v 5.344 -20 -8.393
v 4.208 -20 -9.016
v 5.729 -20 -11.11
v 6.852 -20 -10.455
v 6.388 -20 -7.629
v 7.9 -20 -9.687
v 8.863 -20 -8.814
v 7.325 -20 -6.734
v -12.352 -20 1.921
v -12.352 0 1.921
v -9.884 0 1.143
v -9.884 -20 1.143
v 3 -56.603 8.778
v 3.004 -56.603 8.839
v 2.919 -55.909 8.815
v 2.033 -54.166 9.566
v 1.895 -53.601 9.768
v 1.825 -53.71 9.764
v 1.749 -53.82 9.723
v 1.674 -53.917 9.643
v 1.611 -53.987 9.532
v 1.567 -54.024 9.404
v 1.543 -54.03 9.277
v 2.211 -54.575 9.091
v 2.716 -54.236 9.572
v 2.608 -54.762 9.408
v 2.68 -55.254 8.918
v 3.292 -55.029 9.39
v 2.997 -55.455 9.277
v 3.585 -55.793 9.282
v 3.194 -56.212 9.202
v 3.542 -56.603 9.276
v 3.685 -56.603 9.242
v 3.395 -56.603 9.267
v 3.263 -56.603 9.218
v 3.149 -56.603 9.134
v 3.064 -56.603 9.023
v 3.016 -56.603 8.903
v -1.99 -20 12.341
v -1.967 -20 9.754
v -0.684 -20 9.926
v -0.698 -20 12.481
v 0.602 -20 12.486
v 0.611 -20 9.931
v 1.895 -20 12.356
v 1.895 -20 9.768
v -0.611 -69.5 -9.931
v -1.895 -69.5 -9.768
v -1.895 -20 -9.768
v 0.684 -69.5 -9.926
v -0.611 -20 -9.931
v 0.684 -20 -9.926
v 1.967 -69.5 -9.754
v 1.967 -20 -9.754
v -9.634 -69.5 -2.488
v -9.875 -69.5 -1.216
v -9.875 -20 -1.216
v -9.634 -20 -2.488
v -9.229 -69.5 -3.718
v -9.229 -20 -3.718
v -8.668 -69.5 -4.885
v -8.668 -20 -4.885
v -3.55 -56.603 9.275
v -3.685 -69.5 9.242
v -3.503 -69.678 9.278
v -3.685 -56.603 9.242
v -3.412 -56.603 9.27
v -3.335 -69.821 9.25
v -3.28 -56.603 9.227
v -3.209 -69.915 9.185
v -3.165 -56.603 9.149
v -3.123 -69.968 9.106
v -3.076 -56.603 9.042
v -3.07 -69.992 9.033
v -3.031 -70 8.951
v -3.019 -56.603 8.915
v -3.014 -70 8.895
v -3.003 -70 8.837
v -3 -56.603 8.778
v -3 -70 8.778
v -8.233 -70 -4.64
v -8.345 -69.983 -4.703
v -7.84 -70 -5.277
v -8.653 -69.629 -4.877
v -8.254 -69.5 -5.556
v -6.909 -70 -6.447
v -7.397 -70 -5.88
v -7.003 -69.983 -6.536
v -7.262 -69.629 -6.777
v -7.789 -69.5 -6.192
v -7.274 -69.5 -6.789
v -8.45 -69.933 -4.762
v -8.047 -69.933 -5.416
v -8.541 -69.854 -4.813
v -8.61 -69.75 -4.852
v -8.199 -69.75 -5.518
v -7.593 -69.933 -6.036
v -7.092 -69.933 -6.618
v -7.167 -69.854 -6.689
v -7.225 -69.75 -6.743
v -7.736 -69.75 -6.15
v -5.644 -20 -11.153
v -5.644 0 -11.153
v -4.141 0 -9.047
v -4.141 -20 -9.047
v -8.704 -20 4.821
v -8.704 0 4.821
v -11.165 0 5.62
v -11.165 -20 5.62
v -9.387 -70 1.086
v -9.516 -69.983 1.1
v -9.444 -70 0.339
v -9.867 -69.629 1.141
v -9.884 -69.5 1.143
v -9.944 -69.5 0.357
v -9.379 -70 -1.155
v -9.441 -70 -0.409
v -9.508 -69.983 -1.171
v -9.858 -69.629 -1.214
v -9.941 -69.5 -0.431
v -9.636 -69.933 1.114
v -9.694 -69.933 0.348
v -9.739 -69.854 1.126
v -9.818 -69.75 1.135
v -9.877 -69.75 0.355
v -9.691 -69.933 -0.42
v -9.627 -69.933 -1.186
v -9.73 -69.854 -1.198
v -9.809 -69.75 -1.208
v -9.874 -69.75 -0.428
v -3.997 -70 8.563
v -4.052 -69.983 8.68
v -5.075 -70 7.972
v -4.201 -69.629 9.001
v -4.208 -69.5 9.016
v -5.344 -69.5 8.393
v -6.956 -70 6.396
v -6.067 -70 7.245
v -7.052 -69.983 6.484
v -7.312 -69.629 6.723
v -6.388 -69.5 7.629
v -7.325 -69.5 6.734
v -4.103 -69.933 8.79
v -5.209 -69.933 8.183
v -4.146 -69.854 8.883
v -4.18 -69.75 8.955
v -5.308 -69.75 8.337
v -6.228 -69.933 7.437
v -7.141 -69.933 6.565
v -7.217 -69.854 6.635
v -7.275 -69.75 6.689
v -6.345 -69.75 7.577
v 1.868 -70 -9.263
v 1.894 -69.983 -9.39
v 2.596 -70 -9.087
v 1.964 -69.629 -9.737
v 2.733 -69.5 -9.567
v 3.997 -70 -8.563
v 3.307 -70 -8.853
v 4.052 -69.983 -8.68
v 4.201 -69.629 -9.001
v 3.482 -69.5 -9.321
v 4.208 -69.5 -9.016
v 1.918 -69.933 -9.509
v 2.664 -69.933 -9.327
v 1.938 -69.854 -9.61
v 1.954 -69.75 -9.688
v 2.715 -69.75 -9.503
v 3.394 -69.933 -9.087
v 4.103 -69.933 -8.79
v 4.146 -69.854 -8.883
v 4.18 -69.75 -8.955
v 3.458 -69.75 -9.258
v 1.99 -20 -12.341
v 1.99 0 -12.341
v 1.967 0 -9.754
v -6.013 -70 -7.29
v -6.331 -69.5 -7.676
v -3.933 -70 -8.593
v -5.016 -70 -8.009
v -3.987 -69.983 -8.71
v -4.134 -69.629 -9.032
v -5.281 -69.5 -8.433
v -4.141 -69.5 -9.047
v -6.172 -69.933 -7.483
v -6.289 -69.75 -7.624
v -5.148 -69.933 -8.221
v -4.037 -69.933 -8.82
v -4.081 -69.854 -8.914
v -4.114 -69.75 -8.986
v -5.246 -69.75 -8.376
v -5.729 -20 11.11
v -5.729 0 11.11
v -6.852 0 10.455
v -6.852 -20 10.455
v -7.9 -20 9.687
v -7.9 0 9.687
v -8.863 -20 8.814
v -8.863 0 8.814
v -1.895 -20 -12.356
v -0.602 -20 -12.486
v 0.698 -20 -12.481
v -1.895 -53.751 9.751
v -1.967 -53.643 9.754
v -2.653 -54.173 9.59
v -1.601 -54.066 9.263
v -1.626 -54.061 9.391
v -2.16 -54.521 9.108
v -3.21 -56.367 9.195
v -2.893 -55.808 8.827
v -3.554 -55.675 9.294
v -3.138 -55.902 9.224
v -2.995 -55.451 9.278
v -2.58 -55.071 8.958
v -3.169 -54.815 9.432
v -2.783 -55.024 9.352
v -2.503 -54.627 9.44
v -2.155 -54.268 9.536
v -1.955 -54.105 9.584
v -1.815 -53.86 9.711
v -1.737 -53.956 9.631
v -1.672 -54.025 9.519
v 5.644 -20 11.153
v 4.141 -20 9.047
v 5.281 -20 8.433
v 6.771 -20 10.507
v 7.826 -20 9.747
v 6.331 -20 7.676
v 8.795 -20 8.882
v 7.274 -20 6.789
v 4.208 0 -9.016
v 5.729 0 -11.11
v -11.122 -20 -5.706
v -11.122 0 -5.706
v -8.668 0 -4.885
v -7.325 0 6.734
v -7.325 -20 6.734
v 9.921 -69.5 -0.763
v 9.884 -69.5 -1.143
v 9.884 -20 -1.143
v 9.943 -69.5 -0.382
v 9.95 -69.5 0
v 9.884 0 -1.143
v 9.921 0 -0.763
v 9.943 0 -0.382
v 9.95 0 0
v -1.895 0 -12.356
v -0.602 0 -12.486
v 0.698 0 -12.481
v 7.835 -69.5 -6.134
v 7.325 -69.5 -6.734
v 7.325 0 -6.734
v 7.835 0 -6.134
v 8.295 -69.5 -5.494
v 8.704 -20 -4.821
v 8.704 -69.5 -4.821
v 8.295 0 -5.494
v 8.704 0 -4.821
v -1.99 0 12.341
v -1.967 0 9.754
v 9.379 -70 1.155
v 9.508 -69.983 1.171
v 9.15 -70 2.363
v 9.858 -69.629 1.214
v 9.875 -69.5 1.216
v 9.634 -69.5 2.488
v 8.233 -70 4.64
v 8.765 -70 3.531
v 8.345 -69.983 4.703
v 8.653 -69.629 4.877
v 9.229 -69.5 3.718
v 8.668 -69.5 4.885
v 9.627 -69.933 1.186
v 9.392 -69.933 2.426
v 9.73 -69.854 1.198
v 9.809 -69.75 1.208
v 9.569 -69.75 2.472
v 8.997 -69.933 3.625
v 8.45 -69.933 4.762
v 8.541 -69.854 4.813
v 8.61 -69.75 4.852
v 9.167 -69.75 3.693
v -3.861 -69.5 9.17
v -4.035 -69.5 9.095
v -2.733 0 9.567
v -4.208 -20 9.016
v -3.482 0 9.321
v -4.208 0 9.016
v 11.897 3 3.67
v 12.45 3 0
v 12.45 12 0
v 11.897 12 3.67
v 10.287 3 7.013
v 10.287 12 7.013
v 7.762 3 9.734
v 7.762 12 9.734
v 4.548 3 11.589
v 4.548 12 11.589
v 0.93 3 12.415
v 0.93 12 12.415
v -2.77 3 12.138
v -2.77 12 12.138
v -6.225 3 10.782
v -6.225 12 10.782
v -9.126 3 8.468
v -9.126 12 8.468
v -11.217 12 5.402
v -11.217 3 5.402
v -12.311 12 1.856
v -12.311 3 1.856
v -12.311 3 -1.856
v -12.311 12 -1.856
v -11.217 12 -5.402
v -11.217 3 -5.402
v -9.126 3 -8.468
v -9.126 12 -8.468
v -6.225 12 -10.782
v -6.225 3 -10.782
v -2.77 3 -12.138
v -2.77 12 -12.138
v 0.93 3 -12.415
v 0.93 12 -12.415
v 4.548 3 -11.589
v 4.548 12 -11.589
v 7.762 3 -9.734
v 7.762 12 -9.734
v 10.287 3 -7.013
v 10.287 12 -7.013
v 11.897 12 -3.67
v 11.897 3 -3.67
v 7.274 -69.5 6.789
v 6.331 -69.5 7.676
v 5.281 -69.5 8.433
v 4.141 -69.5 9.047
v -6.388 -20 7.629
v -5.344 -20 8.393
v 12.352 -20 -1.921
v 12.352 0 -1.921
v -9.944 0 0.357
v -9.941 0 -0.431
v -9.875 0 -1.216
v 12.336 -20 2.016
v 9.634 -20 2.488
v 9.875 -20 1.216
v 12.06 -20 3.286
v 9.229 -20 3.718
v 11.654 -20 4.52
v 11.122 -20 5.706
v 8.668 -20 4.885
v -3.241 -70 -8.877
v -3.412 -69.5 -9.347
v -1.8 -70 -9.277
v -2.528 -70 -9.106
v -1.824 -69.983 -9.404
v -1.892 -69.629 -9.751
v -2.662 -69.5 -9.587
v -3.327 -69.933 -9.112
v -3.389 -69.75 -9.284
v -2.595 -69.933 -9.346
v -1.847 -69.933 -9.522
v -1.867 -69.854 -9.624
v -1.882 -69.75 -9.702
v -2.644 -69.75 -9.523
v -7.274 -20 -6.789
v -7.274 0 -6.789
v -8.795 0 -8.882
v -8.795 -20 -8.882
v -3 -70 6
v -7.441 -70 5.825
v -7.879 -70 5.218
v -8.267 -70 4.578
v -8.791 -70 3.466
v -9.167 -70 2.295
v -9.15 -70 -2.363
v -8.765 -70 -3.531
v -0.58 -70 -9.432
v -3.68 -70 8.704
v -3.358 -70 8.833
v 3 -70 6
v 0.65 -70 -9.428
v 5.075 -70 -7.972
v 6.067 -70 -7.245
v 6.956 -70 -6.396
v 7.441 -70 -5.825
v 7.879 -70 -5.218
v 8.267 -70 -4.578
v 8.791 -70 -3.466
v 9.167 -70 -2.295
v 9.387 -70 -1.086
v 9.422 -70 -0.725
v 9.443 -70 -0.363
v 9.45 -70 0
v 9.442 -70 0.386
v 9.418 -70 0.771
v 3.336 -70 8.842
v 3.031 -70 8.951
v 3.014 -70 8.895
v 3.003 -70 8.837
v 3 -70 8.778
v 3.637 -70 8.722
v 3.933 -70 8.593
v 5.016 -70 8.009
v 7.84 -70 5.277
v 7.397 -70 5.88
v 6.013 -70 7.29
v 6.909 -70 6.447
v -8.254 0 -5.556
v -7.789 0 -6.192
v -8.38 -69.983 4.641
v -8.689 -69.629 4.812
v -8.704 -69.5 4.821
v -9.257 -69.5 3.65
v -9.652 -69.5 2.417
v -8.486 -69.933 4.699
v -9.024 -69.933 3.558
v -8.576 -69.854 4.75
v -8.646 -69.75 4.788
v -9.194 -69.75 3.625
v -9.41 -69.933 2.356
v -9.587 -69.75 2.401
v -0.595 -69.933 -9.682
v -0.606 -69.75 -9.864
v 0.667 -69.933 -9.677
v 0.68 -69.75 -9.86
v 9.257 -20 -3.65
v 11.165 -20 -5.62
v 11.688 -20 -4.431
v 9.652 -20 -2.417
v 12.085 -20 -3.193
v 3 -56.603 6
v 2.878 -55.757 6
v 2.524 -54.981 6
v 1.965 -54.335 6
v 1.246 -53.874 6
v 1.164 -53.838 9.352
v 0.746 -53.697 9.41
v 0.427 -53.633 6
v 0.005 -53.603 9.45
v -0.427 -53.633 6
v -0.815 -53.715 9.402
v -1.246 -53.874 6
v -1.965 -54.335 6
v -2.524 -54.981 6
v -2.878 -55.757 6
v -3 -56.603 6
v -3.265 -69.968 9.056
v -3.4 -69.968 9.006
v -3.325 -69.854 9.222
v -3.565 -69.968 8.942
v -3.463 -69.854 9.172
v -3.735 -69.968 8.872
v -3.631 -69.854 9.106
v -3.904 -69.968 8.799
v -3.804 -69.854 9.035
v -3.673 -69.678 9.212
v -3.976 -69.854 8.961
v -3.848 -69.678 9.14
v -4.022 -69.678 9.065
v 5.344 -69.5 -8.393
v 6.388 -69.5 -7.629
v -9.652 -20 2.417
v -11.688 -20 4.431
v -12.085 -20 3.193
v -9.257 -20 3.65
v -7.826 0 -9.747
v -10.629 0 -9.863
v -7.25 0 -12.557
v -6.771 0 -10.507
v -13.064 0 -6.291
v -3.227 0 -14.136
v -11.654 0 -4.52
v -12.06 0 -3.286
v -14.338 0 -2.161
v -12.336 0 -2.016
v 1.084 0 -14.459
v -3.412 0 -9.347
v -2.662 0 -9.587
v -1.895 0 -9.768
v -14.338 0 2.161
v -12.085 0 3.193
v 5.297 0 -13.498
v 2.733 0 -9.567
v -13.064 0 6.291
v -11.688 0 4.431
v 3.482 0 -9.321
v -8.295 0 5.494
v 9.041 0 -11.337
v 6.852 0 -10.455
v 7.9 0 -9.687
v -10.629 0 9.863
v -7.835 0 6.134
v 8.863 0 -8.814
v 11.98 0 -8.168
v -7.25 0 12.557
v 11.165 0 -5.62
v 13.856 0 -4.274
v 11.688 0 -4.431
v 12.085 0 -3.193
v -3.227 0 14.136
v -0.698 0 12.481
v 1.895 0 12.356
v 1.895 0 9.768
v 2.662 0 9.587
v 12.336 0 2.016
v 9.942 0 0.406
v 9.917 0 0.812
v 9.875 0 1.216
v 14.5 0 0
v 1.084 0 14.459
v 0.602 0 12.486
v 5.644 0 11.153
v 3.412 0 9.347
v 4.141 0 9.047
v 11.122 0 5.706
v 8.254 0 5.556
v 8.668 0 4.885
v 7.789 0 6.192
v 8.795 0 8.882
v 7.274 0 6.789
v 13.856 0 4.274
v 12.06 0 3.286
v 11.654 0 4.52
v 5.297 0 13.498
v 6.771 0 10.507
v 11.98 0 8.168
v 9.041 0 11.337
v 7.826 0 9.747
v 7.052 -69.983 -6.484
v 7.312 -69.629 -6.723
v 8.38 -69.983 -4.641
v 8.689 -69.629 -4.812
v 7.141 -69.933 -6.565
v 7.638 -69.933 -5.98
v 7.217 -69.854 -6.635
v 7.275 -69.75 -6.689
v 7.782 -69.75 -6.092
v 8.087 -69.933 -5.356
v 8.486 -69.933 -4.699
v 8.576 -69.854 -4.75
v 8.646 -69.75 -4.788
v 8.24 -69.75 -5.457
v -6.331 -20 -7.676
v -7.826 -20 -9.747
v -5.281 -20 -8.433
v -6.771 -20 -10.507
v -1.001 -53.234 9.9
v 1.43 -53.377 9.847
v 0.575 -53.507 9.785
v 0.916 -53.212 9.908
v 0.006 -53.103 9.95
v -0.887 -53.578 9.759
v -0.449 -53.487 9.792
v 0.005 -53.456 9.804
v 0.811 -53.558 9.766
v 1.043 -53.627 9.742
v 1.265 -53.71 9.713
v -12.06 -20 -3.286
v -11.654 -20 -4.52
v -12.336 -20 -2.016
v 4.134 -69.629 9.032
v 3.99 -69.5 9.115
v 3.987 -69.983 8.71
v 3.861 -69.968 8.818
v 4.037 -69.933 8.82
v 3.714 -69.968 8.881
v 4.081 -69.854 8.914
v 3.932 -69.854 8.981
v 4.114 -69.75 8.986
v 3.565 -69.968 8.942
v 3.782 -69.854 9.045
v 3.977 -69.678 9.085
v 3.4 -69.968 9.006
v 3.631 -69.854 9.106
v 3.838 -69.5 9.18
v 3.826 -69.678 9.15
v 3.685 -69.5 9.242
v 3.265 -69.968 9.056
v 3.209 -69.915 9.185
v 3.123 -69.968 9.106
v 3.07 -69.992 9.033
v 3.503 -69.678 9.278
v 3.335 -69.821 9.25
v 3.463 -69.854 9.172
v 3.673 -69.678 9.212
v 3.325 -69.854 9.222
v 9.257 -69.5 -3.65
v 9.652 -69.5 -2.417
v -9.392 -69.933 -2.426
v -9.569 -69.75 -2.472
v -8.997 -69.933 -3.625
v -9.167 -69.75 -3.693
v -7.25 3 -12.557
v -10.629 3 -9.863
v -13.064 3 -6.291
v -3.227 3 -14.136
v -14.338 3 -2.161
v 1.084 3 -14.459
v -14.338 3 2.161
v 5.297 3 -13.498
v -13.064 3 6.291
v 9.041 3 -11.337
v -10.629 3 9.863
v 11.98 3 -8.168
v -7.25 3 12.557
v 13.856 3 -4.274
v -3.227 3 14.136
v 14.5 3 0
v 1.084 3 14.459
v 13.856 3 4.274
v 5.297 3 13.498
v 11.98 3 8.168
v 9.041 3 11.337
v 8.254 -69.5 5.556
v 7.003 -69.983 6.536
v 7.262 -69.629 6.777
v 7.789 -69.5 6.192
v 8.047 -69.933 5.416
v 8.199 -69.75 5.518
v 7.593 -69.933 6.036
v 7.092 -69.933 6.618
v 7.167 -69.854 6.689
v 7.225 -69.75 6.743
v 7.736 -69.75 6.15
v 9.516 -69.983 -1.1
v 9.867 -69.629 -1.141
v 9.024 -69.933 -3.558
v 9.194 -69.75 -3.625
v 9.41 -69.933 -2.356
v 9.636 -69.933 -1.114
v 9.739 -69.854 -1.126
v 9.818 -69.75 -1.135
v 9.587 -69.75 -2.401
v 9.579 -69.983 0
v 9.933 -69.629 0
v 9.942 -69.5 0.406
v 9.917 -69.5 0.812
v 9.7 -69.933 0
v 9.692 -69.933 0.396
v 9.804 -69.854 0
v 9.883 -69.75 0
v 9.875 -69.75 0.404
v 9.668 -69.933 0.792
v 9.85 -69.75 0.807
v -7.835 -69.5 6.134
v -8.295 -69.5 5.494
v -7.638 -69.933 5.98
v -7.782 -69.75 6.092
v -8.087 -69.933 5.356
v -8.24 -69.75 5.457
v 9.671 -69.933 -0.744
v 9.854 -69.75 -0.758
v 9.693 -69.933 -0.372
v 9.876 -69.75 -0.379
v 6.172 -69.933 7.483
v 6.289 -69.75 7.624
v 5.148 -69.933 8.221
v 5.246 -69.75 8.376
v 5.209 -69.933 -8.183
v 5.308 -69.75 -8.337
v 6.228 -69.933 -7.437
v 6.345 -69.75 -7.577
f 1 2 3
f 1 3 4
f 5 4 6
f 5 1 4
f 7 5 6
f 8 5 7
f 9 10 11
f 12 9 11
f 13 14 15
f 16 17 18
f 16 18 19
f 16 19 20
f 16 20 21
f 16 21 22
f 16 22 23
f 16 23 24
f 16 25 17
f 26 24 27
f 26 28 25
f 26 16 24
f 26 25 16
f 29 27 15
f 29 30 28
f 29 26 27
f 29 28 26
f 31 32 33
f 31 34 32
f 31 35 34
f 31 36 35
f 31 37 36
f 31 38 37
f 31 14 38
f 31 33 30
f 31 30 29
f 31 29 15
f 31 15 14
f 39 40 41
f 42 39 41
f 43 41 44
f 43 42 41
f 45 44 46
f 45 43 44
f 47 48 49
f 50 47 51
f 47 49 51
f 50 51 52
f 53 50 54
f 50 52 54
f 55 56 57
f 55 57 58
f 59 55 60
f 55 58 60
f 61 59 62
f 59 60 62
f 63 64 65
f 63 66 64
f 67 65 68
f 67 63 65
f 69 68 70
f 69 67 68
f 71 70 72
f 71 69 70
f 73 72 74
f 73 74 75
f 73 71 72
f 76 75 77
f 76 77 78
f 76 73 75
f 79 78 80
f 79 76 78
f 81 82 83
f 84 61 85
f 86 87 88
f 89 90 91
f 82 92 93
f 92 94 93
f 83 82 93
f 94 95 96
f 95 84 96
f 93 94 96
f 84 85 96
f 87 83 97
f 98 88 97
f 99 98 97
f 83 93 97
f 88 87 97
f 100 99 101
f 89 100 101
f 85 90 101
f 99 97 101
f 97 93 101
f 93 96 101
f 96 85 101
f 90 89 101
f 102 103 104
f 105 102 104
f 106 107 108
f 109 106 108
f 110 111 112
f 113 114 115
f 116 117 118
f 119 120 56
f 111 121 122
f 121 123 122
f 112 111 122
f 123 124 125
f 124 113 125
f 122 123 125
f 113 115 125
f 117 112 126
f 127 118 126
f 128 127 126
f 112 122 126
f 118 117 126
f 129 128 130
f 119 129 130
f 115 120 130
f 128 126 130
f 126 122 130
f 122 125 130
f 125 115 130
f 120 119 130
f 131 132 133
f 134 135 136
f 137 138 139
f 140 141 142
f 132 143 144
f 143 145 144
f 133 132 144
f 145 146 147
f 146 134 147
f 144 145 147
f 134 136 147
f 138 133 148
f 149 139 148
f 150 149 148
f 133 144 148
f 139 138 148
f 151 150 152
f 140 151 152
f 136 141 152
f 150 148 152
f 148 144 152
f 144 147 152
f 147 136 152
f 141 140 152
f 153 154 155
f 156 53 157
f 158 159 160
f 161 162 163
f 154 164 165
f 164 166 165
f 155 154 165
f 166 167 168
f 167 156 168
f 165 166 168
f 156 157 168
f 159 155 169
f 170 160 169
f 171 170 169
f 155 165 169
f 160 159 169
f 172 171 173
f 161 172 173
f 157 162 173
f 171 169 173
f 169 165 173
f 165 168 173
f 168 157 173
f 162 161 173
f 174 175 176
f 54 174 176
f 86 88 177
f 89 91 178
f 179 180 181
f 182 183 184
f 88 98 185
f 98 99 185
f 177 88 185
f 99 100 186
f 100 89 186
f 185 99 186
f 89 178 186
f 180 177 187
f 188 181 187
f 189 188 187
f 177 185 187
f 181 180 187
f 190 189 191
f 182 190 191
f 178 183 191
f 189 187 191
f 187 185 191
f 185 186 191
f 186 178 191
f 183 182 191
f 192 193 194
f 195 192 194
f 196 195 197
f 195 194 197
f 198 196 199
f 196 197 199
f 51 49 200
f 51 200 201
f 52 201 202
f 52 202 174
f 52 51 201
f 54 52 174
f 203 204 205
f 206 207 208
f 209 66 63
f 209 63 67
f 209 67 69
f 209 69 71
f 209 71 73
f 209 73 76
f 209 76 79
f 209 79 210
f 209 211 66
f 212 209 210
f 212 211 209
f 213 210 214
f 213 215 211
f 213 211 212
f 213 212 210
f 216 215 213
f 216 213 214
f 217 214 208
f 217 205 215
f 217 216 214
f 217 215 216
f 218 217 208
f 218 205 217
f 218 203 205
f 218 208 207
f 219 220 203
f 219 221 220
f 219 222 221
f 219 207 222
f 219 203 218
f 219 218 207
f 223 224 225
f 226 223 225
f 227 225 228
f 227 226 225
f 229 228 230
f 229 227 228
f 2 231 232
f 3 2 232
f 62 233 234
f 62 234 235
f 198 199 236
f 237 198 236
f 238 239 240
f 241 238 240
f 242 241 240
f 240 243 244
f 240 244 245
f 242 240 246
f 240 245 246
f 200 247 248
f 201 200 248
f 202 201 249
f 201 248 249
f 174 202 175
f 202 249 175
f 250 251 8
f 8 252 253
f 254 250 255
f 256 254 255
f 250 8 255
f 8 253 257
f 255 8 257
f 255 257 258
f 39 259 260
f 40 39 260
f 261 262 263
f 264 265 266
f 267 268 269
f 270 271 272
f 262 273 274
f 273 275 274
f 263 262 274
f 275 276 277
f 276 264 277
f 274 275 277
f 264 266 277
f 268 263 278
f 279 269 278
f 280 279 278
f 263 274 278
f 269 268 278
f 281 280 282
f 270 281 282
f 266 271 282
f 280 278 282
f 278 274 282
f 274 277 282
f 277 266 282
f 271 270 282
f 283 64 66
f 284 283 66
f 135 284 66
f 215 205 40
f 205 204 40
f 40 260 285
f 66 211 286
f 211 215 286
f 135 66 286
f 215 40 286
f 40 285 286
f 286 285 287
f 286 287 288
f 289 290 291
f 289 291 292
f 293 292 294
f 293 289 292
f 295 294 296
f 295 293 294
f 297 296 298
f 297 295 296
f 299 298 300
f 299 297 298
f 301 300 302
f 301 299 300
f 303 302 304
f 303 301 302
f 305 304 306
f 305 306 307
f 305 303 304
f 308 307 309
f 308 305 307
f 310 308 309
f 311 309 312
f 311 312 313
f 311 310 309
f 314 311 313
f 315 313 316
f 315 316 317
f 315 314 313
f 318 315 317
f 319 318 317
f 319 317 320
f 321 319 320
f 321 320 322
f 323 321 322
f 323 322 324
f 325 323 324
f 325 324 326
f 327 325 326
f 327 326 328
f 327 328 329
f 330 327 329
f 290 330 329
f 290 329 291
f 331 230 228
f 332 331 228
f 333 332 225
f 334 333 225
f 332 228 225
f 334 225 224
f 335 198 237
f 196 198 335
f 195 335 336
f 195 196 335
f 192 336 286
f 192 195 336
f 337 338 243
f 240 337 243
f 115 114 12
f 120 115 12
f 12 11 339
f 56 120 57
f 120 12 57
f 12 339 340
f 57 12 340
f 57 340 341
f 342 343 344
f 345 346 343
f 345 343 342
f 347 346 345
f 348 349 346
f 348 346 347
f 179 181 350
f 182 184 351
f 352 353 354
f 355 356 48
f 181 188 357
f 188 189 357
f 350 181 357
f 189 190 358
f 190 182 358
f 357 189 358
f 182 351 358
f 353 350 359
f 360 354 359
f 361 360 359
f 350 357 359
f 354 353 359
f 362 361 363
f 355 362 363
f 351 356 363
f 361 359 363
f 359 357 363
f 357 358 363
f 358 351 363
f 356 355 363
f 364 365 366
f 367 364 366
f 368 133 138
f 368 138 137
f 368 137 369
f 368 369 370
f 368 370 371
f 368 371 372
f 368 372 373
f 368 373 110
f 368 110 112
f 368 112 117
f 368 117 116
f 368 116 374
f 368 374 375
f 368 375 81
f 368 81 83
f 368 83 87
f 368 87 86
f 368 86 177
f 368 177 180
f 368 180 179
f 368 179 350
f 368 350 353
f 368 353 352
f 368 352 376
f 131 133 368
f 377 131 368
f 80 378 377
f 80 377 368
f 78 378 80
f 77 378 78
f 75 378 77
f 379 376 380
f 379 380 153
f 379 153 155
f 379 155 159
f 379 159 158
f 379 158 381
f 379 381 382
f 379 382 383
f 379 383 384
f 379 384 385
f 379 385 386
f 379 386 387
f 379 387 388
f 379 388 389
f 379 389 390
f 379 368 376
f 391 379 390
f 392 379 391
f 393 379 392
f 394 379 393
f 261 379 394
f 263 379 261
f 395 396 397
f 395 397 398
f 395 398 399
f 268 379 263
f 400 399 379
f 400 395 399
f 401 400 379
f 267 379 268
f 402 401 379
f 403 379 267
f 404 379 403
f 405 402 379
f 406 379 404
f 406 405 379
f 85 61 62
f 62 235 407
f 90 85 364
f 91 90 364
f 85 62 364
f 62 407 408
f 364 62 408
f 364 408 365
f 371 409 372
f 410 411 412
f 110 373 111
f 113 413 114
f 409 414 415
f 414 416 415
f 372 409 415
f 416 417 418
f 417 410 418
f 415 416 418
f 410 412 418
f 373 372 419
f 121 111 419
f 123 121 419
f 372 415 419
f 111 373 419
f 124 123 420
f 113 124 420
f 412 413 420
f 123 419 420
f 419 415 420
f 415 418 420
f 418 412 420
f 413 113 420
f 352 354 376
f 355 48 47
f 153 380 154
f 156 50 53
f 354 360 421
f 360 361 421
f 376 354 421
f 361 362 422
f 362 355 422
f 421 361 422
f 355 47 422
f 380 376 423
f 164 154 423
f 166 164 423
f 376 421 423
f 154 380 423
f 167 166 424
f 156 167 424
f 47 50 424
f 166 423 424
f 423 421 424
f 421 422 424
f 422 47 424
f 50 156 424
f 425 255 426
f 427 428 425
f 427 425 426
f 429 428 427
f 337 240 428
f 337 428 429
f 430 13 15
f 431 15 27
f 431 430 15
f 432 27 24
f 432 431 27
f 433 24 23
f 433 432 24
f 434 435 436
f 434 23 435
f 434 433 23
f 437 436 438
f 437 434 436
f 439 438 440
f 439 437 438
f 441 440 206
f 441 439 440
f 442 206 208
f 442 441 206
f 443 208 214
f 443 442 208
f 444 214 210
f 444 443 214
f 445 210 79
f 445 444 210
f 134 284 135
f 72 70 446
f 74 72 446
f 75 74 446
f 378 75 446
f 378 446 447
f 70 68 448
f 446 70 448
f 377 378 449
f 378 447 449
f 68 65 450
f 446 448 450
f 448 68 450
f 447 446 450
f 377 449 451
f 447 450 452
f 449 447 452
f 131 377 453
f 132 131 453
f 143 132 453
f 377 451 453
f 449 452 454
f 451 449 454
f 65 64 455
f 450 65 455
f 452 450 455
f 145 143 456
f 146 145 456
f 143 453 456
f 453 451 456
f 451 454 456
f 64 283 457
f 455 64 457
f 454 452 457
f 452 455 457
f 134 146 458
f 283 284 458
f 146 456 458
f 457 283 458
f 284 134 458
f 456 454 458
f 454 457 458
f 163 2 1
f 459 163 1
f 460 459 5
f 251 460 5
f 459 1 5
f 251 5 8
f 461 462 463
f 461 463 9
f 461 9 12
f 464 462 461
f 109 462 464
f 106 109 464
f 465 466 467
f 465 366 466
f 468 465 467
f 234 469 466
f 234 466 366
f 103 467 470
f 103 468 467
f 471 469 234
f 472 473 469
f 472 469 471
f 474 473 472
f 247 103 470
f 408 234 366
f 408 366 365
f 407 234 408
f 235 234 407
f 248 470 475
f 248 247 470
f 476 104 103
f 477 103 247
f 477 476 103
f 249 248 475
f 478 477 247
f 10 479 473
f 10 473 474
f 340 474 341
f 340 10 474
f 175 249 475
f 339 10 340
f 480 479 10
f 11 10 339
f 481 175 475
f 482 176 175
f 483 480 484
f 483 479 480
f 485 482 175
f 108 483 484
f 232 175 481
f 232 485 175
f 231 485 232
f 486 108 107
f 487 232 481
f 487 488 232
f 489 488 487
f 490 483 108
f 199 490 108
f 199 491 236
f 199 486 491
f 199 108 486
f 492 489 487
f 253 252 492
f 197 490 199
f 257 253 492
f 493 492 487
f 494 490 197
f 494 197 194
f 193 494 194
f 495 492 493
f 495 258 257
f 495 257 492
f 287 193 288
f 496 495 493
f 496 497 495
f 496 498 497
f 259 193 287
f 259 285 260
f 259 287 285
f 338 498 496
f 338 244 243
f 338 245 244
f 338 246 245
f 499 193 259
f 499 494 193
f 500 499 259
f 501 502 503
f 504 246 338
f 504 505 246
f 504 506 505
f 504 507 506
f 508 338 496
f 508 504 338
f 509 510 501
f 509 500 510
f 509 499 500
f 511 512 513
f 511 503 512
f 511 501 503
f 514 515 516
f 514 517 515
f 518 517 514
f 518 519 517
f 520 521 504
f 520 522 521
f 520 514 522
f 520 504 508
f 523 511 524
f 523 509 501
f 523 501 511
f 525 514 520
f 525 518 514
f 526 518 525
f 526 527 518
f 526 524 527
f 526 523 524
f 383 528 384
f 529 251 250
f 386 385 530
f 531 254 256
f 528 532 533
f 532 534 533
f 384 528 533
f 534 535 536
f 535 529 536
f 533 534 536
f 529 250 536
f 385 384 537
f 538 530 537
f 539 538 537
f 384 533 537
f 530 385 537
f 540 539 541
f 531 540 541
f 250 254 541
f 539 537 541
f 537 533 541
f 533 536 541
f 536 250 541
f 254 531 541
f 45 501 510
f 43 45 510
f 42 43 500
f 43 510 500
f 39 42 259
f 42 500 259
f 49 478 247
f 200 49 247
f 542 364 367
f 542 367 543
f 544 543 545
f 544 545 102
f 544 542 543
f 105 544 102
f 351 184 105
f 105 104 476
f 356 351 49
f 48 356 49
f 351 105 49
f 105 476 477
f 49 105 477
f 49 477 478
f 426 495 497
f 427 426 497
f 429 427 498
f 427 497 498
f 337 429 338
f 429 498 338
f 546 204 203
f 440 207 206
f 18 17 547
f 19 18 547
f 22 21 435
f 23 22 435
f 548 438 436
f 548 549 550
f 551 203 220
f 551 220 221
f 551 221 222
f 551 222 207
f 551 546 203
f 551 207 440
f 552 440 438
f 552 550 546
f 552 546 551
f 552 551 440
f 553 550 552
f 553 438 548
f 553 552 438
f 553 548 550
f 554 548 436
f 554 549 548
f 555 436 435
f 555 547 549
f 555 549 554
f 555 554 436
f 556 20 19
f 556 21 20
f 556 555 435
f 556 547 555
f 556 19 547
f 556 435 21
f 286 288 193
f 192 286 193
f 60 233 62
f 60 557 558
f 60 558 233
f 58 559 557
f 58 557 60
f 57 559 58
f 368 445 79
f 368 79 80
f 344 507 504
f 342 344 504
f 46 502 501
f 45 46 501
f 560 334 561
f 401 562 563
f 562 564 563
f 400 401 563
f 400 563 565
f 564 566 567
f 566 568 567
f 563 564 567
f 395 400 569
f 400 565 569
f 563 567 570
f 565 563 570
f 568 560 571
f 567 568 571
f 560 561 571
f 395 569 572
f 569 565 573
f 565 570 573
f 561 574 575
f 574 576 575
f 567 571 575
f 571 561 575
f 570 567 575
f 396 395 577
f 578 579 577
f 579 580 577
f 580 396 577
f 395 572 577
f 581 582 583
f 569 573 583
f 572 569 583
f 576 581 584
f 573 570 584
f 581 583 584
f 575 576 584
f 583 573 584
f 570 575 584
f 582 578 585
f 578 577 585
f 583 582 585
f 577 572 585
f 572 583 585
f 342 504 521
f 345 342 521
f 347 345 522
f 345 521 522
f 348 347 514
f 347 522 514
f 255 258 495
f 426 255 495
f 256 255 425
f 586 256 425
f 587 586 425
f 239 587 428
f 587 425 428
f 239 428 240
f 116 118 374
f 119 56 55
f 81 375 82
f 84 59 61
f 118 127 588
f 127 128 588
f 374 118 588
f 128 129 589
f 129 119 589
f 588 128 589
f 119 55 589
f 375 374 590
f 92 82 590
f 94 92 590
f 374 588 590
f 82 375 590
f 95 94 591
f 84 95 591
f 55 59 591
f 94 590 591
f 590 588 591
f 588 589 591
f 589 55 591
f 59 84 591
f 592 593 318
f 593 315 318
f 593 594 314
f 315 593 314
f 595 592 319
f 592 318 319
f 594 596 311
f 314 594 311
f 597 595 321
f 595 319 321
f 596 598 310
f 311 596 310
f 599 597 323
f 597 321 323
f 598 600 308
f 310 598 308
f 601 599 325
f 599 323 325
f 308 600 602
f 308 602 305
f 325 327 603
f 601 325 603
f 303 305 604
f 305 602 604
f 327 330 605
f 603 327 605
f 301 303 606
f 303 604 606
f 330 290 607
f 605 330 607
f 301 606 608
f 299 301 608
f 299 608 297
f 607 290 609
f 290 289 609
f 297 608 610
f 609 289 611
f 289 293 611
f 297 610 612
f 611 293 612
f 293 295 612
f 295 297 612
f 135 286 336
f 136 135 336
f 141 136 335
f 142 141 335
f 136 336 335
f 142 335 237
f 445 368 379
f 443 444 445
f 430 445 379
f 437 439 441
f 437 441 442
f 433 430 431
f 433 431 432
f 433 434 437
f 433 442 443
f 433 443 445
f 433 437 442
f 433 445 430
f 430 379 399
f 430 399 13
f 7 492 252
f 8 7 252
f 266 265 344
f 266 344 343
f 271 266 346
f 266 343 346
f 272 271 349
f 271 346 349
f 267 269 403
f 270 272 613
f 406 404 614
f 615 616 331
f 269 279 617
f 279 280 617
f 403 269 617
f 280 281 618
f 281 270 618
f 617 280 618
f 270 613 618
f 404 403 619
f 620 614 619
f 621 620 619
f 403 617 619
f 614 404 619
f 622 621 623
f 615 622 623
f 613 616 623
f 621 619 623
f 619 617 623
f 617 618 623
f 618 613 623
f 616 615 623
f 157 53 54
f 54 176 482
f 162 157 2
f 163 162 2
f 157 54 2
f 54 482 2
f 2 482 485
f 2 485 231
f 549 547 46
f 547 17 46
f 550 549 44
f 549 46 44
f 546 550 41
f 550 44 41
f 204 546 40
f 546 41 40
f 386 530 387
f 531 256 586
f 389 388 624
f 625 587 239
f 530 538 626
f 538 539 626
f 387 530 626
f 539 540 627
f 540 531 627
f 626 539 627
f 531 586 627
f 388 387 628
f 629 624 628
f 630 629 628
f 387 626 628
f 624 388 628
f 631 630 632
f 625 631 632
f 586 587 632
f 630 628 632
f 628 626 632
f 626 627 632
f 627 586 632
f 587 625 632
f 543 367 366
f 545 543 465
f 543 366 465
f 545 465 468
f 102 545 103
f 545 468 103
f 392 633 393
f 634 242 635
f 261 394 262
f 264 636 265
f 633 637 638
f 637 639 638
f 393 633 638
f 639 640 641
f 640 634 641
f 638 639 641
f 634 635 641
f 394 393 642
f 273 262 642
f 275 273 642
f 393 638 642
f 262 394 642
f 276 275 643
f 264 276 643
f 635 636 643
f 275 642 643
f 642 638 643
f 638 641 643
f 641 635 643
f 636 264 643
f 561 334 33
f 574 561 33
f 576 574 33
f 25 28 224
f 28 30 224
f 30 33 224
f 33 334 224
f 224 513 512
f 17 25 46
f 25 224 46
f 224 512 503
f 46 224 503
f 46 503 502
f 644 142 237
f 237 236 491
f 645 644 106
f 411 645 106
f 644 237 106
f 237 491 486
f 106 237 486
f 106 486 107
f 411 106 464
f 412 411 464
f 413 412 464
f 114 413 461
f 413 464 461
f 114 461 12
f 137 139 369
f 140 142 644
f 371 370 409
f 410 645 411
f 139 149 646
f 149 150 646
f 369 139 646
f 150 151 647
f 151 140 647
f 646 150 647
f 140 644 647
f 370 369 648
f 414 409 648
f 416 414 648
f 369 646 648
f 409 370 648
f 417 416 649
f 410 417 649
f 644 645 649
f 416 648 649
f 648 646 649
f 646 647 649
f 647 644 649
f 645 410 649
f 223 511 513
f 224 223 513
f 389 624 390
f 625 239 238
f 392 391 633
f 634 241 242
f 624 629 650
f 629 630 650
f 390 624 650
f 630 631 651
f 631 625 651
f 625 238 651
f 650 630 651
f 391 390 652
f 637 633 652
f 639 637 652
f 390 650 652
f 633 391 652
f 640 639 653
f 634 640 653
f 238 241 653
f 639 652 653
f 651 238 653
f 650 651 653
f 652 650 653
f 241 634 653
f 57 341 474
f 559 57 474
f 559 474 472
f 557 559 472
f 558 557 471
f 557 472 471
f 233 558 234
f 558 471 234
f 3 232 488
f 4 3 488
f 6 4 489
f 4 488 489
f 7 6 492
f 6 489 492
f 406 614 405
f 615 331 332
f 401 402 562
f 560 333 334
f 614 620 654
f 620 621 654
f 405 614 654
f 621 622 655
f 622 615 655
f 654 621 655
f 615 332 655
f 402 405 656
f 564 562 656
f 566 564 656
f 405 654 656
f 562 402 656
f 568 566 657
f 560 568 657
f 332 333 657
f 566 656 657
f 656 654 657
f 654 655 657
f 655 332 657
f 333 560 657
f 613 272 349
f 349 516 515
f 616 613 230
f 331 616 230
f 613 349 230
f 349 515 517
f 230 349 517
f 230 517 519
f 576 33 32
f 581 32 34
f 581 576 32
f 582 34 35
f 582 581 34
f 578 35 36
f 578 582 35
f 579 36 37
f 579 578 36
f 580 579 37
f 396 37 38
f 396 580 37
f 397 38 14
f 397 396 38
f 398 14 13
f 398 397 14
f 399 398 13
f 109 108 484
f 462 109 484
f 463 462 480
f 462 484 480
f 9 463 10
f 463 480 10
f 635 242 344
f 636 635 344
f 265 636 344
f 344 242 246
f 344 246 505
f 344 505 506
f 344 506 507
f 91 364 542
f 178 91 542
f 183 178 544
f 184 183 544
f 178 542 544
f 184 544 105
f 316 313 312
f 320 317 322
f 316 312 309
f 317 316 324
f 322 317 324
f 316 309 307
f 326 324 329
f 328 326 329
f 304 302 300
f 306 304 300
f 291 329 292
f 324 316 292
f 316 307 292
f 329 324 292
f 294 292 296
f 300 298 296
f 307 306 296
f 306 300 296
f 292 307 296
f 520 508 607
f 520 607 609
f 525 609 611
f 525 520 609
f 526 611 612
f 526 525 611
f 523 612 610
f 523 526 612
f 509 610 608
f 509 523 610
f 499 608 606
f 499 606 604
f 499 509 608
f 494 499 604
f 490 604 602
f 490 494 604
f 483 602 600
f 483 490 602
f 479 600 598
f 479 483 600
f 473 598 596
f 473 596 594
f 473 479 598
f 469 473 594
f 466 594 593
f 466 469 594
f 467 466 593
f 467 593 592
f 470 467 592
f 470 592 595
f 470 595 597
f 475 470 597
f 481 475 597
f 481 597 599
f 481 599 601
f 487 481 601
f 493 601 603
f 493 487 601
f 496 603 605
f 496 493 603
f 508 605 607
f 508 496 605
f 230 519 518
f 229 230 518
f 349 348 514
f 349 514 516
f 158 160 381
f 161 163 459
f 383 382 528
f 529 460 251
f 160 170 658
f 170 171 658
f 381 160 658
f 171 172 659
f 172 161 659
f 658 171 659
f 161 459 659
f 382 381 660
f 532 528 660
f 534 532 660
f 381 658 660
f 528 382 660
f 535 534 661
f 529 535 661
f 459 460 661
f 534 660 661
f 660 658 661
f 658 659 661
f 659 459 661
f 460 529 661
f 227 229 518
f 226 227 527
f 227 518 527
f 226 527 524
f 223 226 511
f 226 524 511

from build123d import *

# Parameters (mm, degrees)
F1_R     = 14.5
F1_R_2   = 12.45
F2_DEPTH = 3
F3_DEPTH = 12
F4_DEPTH = 20
F5_DEPTH = 70
F8_DEPTH = 25
F9_R     = 0.5


with BuildPart() as f2:
    # F1 (on Front) → F2 (new body)
    with BuildSketch(Plane.XZ):
        Circle(F1_R)
        Circle(F1_R_2, mode=Mode.SUBTRACT)
    extrude(amount=-F2_DEPTH)

    # F1 (on Front) → F3 (join)
    with BuildSketch(Plane.XZ):
        Circle(F1_R_2)
    extrude(amount=-F3_DEPTH)

    # F0 (on Front) → F4 (join)
    with BuildSketch(Plane.XZ):
        with BuildLine():
            ThreePointArc((-7.324554284, 6.7344936366), (-5.8782605878, 8.0279855793), (-4.2084272228, 9.0161876816))
            Line((-4.2084272228, 9.0161876816), (-5.7294038305, 11.1096323858))
            ThreePointArc((-5.7294038305, 11.1096323858), (-7.3861439392, 10.0843878203), (-8.8634461682, 8.8141546403))
            Line((-8.8634461682, 8.8141546403), (-7.324554284, 6.7344936366))
        make_face()
        with BuildLine():
            ThreePointArc((-1.9672528507, 9.7535847882), (-0.0368811837, 9.9499316469), (1.8948930083, 9.7679005158))
            Line((1.8948930083, 9.7679005158), (1.8948930083, 12.3555404773))
            ThreePointArc((1.8948930083, 12.3555404773), (-0.0480615306, 12.4999076032), (-1.9898484698, 12.3406038372))
            Line((-1.9898484698, 12.3406038372), (-1.9672528507, 9.7535847882))
        make_face()
        with BuildLine():
            ThreePointArc((4.141472307, 9.047138063), (5.818585579, 8.0713420111), (7.2744285153, 6.7886073517))
            Line((7.2744285153, 6.7886073517), (8.7954051229, 8.8820520559))
            ThreePointArc((8.7954051229, 8.8820520559), (7.3083787492, 10.140887538), (5.6438037116, 11.15336181))
            Line((5.6438037116, 11.15336181), (4.141472307, 9.047138063))
        make_face()
        with BuildLine():
            ThreePointArc((8.668295807, 4.8849920985), (9.4515504169, 3.1097740619), (9.8753795782, 1.2162969155))
            Line((9.8753795782, 1.2162969155), (12.3363714254, 2.015921639))
            ThreePointArc((12.3363714254, 2.015921639), (11.8732667494, 3.9083931094), (11.121714701, 5.7059146602))
            Line((11.121714701, 5.7059146602), (8.668295807, 4.8849920985))
        make_face()
        with BuildLine():
            Line((12.3515086878, -1.9209979529), (9.8841249332, -1.1430548127))
            ThreePointArc((9.8841249332, -1.1430548127), (9.474344242, -3.0396218816), (8.704271294, -4.820597602))
            Line((8.704271294, -4.820597602), (11.1652631412, -5.6202223254))
            ThreePointArc((11.1652631412, -5.6202223254), (11.9029704089, -3.8169746457), (12.3515086878, -1.9209979529))
        make_face()
        with BuildLine():
            Line((8.8634461682, -8.8141546403), (7.324554284, -6.7344936366))
            ThreePointArc((7.324554284, -6.7344936366), (5.8782605878, -8.0279855793), (4.2084272228, -9.0161876816))
            Line((4.2084272228, -9.0161876816), (5.7294038305, -11.1096323858))
            ThreePointArc((5.7294038305, -11.1096323858), (7.3861439392, -10.0843878203), (8.8634461682, -8.8141546403))
        make_face()
        with BuildLine():
            Line((1.9898484698, -12.3406038372), (1.9672528507, -9.7535847882))
            ThreePointArc((1.9672528507, -9.7535847882), (0.0368811837, -9.9499316469), (-1.8948930083, -9.7679005158))
            Line((-1.8948930083, -9.7679005158), (-1.8948930083, -12.3555404773))
            ThreePointArc((-1.8948930083, -12.3555404773), (0.0480615306, -12.4999076032), (1.9898484698, -12.3406038372))
        make_face()
        with BuildLine():
            Line((-5.6438037116, -11.15336181), (-4.141472307, -9.047138063))
            ThreePointArc((-4.141472307, -9.047138063), (-5.818585579, -8.0713420111), (-7.2744285153, -6.7886073517))
            Line((-7.2744285153, -6.7886073517), (-8.7954051229, -8.8820520559))
            ThreePointArc((-8.7954051229, -8.8820520559), (-7.3083787492, -10.140887538), (-5.6438037116, -11.15336181))
        make_face()
        with BuildLine():
            Line((-11.121714701, -5.7059146602), (-8.668295807, -4.8849920985))
            ThreePointArc((-8.668295807, -4.8849920985), (-9.4515504169, -3.1097740619), (-9.8753795782, -1.2162969155))
            Line((-9.8753795782, -1.2162969155), (-12.3363714254, -2.015921639))
            ThreePointArc((-12.3363714254, -2.015921639), (-11.8732667494, -3.9083931094), (-11.121714701, -5.7059146602))
        make_face()
        with BuildLine():
            ThreePointArc((-9.8841249332, 1.1430548127), (-9.474344242, 3.0396218816), (-8.704271294, 4.820597602))
            Line((-8.704271294, 4.820597602), (-11.1652631412, 5.6202223254))
            ThreePointArc((-11.1652631412, 5.6202223254), (-11.9029704089, 3.8169746457), (-12.3515086878, 1.9209979529))
            Line((-12.3515086878, 1.9209979529), (-9.8841249332, 1.1430548127))
        make_face()
    extrude(amount=F4_DEPTH)

    # F0 (on Front) → F5 (join)
    with BuildSketch(Plane.XZ):
        with BuildLine():
            ThreePointArc((9.8841249332, -1.1430548127), (9.9335175815, -0.5724757264), (9.95, 0))
            ThreePointArc((9.95, 0), (9.9313273736, 0.6092918829), (9.8753795782, 1.2162969155))
            ThreePointArc((9.8753795782, 1.2162969155), (9.4515504169, 3.1097740619), (8.668295807, 4.8849920985))
            ThreePointArc((8.668295807, 4.8849920985), (8.0279855793, 5.8782605878), (7.2744285153, 6.7886073517))
            ThreePointArc((7.2744285153, 6.7886073517), (5.818585579, 8.0713420111), (4.141472307, 9.047138063))
            ThreePointArc((4.141472307, 9.047138063), (3.0396218816, 9.474344242), (1.8948930083, 9.7679005158))
            ThreePointArc((1.8948930083, 9.7679005158), (-0.0368811837, 9.9499316469), (-1.9672528507, 9.7535847882))
            ThreePointArc((-1.9672528507, 9.7535847882), (-3.1097740619, 9.4515504169), (-4.2084272228, 9.0161876816))
            ThreePointArc((-4.2084272228, 9.0161876816), (-5.8782605878, 8.0279855793), (-7.324554284, 6.7344936366))
            ThreePointArc((-7.324554284, 6.7344936366), (-8.0713420111, 5.818585579), (-8.704271294, 4.820597602))
            ThreePointArc((-8.704271294, 4.820597602), (-9.474344242, 3.0396218816), (-9.8841249332, 1.1430548127))
            ThreePointArc((-9.8841249332, 1.1430548127), (-9.9499316469, -0.0368811837), (-9.8753795782, -1.2162969155))
            ThreePointArc((-9.8753795782, -1.2162969155), (-9.4515504169, -3.1097740619), (-8.668295807, -4.8849920985))
            ThreePointArc((-8.668295807, -4.8849920985), (-8.0279855793, -5.8782605878), (-7.2744285153, -6.7886073517))
            ThreePointArc((-7.2744285153, -6.7886073517), (-5.818585579, -8.0713420111), (-4.141472307, -9.047138063))
            ThreePointArc((-4.141472307, -9.047138063), (-3.0396218816, -9.474344242), (-1.8948930083, -9.7679005158))
            ThreePointArc((-1.8948930083, -9.7679005158), (0.0368811837, -9.9499316469), (1.9672528507, -9.7535847882))
            ThreePointArc((1.9672528507, -9.7535847882), (3.1097740619, -9.4515504169), (4.2084272228, -9.0161876816))
            ThreePointArc((4.2084272228, -9.0161876816), (5.8782605878, -8.0279855793), (7.324554284, -6.7344936366))
            ThreePointArc((7.324554284, -6.7344936366), (8.0713420111, -5.818585579), (8.704271294, -4.820597602))
            ThreePointArc((8.704271294, -4.820597602), (9.474344242, -3.0396218816), (9.8841249332, -1.1430548127))
        make_face()
    extrude(amount=F5_DEPTH)

    # F7 (on offset) → F8 (cut)
    with BuildSketch(Plane.XY.offset(6)):
        with BuildLine():
            Line((-3, -74.6025964618), (0, -74.6025964618))
            Line((0, -74.6025964618), (3, -74.6025964618))
            Line((3, -74.6025964618), (3, -56.6025964618))
            ThreePointArc((3, -56.6025964618), (0, -53.6025964618), (-3, -56.6025964618))
            Line((-3, -56.6025964618), (-3, -74.6025964618))
        make_face()
    extrude(amount=F8_DEPTH, mode=Mode.SUBTRACT)

    # F9
    f9_edges = [f2.edges().sort_by_distance(p)[0] for p in [
        (-3, -63.301298, 9.486965),
        (0, -53.602596, 9.95),
        (3, -63.301298, 9.486965),
        (-5.377611, -70, -8.371607),
        (7.65146, -70, 6.360634),
    ]]
    fillet(f9_edges, radius=F9_R)


solid = f2.part
